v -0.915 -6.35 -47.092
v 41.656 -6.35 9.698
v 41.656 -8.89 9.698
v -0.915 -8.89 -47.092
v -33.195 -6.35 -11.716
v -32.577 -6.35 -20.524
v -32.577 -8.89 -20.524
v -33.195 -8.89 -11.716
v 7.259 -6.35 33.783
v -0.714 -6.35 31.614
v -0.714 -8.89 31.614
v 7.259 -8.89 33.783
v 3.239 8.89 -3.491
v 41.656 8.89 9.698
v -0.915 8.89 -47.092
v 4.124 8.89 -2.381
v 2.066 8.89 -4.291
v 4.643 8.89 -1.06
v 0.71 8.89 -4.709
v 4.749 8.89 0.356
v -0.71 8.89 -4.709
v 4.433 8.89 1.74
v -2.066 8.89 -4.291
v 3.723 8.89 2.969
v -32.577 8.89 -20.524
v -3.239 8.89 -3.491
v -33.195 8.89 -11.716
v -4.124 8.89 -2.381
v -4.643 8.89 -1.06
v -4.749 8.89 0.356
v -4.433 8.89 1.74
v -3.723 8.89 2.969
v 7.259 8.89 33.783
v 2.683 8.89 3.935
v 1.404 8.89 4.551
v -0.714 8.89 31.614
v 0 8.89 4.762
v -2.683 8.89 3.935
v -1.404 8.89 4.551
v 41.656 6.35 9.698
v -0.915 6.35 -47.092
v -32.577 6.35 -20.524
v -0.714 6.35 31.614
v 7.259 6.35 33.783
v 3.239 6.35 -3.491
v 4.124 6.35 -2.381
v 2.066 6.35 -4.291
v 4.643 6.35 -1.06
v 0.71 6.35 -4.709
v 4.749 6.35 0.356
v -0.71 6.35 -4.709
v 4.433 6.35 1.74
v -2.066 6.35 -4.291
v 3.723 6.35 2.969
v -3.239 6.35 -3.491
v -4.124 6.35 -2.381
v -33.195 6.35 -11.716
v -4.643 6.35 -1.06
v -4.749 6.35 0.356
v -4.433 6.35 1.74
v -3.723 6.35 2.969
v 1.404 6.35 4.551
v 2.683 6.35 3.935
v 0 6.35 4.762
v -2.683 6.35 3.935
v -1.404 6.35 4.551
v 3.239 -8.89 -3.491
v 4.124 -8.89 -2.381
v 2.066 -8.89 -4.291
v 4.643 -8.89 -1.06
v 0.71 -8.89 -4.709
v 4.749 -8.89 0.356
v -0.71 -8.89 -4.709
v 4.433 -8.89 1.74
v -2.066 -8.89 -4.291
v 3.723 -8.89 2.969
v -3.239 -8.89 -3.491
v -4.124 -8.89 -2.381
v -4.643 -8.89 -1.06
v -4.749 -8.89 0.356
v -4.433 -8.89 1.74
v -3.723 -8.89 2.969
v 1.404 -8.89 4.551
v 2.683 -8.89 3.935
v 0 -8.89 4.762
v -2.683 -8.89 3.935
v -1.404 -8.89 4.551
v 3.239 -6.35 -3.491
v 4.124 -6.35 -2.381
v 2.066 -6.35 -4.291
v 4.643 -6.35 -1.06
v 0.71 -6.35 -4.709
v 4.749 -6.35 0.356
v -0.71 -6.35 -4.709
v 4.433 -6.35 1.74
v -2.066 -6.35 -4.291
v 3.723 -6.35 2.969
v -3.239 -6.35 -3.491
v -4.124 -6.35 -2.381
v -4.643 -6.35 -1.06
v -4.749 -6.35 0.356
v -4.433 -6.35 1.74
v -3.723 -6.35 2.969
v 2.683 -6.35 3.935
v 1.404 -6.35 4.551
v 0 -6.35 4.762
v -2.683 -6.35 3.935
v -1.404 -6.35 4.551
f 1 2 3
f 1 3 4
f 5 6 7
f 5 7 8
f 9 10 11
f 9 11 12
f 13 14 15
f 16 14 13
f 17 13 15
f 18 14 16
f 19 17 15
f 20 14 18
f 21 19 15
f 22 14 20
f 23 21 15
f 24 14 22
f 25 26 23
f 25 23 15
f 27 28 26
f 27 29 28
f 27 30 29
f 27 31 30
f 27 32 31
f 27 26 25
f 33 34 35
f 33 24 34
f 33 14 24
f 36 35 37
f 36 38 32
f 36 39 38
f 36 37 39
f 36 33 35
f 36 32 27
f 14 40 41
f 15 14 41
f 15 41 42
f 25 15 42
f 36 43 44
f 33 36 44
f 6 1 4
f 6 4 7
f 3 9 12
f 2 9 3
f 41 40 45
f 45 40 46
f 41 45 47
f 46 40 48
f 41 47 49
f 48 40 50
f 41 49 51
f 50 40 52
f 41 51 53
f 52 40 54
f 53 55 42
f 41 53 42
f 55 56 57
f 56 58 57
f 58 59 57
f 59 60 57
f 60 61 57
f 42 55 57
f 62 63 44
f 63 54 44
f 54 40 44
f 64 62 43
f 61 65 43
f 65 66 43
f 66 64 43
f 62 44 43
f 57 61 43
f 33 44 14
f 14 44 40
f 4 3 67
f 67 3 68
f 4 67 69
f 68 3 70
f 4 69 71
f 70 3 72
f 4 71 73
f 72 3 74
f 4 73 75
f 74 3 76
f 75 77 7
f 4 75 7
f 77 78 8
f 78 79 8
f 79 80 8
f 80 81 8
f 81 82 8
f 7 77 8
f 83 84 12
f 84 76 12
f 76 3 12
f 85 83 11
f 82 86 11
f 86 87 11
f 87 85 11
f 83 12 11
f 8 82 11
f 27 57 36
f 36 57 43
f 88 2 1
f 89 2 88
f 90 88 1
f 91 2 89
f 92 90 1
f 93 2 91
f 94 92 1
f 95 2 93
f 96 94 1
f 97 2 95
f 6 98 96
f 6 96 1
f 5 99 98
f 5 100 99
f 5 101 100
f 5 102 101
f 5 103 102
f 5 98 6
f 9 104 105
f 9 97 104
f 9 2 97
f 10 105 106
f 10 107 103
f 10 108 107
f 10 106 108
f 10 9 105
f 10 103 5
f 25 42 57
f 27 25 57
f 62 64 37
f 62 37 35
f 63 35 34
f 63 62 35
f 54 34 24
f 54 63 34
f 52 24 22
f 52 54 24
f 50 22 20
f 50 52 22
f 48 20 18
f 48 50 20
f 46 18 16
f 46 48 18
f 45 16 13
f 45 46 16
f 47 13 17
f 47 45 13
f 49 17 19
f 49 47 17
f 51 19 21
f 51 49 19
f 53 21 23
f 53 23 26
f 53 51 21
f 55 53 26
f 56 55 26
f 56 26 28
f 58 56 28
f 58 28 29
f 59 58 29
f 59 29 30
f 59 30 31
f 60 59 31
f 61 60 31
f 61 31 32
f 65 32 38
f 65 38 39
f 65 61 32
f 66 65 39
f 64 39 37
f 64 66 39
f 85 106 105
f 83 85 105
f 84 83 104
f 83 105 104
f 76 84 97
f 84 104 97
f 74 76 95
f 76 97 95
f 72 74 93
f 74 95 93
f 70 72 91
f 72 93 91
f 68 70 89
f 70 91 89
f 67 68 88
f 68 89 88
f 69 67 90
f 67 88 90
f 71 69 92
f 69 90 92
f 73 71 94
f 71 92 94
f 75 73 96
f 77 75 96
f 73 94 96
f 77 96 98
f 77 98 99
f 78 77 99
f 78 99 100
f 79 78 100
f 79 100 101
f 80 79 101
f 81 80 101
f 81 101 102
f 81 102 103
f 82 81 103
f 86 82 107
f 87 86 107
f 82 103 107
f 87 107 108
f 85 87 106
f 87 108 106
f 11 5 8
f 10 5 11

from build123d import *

# Parameters (mm, degrees)
SKETCH2_R           = 4.7625
BOSS_EXTRUDE1_DEPTH = 2.54
SKETCH3_R           = 4.7625
BOSS_EXTRUDE2_DEPTH = 2.54


with BuildPart() as part:
    # Sketch2 → Boss-Extrude1 (new body)
    with BuildSketch(Plane(origin=(0, 6.35, 0), x_dir=(-1, 0, 0), z_dir=(0, 1, 0))):
        Polygon((-41.655528976, 9.698028228), (0.915104633, -47.091558912), (32.577290188, -20.52382815), (33.194911519, -11.716245654), (0.713995358, 31.613572635), (-7.258770993, 33.782899871), align=None)
        with Locations(Location((0, 0, 0), (0, 0, 90))):
            Circle(SKETCH2_R, mode=Mode.SUBTRACT)
    extrude(amount=BOSS_EXTRUDE1_DEPTH)


with BuildPart() as body_2:
    # Sketch3 → Boss-Extrude2 (new body)
    with BuildSketch(Plane(origin=(0, -6.35, 0), x_dir=(-1, 0, 0), z_dir=(0, 1, 0))):
        Polygon((-7.258770993, 33.782899871), (-41.655528976, 9.698028228), (0.915104633, -47.091558912), (32.577290188, -20.52382815), (33.194911519, -11.716245654), (0.713995358, 31.613572635), align=None)
        with Locations(Location((0, 0, 0), (0, 0, 90))):
            Circle(SKETCH3_R, mode=Mode.SUBTRACT)
    extrude(amount=-BOSS_EXTRUDE2_DEPTH)


solid = Compound([part.part, body_2.part])
